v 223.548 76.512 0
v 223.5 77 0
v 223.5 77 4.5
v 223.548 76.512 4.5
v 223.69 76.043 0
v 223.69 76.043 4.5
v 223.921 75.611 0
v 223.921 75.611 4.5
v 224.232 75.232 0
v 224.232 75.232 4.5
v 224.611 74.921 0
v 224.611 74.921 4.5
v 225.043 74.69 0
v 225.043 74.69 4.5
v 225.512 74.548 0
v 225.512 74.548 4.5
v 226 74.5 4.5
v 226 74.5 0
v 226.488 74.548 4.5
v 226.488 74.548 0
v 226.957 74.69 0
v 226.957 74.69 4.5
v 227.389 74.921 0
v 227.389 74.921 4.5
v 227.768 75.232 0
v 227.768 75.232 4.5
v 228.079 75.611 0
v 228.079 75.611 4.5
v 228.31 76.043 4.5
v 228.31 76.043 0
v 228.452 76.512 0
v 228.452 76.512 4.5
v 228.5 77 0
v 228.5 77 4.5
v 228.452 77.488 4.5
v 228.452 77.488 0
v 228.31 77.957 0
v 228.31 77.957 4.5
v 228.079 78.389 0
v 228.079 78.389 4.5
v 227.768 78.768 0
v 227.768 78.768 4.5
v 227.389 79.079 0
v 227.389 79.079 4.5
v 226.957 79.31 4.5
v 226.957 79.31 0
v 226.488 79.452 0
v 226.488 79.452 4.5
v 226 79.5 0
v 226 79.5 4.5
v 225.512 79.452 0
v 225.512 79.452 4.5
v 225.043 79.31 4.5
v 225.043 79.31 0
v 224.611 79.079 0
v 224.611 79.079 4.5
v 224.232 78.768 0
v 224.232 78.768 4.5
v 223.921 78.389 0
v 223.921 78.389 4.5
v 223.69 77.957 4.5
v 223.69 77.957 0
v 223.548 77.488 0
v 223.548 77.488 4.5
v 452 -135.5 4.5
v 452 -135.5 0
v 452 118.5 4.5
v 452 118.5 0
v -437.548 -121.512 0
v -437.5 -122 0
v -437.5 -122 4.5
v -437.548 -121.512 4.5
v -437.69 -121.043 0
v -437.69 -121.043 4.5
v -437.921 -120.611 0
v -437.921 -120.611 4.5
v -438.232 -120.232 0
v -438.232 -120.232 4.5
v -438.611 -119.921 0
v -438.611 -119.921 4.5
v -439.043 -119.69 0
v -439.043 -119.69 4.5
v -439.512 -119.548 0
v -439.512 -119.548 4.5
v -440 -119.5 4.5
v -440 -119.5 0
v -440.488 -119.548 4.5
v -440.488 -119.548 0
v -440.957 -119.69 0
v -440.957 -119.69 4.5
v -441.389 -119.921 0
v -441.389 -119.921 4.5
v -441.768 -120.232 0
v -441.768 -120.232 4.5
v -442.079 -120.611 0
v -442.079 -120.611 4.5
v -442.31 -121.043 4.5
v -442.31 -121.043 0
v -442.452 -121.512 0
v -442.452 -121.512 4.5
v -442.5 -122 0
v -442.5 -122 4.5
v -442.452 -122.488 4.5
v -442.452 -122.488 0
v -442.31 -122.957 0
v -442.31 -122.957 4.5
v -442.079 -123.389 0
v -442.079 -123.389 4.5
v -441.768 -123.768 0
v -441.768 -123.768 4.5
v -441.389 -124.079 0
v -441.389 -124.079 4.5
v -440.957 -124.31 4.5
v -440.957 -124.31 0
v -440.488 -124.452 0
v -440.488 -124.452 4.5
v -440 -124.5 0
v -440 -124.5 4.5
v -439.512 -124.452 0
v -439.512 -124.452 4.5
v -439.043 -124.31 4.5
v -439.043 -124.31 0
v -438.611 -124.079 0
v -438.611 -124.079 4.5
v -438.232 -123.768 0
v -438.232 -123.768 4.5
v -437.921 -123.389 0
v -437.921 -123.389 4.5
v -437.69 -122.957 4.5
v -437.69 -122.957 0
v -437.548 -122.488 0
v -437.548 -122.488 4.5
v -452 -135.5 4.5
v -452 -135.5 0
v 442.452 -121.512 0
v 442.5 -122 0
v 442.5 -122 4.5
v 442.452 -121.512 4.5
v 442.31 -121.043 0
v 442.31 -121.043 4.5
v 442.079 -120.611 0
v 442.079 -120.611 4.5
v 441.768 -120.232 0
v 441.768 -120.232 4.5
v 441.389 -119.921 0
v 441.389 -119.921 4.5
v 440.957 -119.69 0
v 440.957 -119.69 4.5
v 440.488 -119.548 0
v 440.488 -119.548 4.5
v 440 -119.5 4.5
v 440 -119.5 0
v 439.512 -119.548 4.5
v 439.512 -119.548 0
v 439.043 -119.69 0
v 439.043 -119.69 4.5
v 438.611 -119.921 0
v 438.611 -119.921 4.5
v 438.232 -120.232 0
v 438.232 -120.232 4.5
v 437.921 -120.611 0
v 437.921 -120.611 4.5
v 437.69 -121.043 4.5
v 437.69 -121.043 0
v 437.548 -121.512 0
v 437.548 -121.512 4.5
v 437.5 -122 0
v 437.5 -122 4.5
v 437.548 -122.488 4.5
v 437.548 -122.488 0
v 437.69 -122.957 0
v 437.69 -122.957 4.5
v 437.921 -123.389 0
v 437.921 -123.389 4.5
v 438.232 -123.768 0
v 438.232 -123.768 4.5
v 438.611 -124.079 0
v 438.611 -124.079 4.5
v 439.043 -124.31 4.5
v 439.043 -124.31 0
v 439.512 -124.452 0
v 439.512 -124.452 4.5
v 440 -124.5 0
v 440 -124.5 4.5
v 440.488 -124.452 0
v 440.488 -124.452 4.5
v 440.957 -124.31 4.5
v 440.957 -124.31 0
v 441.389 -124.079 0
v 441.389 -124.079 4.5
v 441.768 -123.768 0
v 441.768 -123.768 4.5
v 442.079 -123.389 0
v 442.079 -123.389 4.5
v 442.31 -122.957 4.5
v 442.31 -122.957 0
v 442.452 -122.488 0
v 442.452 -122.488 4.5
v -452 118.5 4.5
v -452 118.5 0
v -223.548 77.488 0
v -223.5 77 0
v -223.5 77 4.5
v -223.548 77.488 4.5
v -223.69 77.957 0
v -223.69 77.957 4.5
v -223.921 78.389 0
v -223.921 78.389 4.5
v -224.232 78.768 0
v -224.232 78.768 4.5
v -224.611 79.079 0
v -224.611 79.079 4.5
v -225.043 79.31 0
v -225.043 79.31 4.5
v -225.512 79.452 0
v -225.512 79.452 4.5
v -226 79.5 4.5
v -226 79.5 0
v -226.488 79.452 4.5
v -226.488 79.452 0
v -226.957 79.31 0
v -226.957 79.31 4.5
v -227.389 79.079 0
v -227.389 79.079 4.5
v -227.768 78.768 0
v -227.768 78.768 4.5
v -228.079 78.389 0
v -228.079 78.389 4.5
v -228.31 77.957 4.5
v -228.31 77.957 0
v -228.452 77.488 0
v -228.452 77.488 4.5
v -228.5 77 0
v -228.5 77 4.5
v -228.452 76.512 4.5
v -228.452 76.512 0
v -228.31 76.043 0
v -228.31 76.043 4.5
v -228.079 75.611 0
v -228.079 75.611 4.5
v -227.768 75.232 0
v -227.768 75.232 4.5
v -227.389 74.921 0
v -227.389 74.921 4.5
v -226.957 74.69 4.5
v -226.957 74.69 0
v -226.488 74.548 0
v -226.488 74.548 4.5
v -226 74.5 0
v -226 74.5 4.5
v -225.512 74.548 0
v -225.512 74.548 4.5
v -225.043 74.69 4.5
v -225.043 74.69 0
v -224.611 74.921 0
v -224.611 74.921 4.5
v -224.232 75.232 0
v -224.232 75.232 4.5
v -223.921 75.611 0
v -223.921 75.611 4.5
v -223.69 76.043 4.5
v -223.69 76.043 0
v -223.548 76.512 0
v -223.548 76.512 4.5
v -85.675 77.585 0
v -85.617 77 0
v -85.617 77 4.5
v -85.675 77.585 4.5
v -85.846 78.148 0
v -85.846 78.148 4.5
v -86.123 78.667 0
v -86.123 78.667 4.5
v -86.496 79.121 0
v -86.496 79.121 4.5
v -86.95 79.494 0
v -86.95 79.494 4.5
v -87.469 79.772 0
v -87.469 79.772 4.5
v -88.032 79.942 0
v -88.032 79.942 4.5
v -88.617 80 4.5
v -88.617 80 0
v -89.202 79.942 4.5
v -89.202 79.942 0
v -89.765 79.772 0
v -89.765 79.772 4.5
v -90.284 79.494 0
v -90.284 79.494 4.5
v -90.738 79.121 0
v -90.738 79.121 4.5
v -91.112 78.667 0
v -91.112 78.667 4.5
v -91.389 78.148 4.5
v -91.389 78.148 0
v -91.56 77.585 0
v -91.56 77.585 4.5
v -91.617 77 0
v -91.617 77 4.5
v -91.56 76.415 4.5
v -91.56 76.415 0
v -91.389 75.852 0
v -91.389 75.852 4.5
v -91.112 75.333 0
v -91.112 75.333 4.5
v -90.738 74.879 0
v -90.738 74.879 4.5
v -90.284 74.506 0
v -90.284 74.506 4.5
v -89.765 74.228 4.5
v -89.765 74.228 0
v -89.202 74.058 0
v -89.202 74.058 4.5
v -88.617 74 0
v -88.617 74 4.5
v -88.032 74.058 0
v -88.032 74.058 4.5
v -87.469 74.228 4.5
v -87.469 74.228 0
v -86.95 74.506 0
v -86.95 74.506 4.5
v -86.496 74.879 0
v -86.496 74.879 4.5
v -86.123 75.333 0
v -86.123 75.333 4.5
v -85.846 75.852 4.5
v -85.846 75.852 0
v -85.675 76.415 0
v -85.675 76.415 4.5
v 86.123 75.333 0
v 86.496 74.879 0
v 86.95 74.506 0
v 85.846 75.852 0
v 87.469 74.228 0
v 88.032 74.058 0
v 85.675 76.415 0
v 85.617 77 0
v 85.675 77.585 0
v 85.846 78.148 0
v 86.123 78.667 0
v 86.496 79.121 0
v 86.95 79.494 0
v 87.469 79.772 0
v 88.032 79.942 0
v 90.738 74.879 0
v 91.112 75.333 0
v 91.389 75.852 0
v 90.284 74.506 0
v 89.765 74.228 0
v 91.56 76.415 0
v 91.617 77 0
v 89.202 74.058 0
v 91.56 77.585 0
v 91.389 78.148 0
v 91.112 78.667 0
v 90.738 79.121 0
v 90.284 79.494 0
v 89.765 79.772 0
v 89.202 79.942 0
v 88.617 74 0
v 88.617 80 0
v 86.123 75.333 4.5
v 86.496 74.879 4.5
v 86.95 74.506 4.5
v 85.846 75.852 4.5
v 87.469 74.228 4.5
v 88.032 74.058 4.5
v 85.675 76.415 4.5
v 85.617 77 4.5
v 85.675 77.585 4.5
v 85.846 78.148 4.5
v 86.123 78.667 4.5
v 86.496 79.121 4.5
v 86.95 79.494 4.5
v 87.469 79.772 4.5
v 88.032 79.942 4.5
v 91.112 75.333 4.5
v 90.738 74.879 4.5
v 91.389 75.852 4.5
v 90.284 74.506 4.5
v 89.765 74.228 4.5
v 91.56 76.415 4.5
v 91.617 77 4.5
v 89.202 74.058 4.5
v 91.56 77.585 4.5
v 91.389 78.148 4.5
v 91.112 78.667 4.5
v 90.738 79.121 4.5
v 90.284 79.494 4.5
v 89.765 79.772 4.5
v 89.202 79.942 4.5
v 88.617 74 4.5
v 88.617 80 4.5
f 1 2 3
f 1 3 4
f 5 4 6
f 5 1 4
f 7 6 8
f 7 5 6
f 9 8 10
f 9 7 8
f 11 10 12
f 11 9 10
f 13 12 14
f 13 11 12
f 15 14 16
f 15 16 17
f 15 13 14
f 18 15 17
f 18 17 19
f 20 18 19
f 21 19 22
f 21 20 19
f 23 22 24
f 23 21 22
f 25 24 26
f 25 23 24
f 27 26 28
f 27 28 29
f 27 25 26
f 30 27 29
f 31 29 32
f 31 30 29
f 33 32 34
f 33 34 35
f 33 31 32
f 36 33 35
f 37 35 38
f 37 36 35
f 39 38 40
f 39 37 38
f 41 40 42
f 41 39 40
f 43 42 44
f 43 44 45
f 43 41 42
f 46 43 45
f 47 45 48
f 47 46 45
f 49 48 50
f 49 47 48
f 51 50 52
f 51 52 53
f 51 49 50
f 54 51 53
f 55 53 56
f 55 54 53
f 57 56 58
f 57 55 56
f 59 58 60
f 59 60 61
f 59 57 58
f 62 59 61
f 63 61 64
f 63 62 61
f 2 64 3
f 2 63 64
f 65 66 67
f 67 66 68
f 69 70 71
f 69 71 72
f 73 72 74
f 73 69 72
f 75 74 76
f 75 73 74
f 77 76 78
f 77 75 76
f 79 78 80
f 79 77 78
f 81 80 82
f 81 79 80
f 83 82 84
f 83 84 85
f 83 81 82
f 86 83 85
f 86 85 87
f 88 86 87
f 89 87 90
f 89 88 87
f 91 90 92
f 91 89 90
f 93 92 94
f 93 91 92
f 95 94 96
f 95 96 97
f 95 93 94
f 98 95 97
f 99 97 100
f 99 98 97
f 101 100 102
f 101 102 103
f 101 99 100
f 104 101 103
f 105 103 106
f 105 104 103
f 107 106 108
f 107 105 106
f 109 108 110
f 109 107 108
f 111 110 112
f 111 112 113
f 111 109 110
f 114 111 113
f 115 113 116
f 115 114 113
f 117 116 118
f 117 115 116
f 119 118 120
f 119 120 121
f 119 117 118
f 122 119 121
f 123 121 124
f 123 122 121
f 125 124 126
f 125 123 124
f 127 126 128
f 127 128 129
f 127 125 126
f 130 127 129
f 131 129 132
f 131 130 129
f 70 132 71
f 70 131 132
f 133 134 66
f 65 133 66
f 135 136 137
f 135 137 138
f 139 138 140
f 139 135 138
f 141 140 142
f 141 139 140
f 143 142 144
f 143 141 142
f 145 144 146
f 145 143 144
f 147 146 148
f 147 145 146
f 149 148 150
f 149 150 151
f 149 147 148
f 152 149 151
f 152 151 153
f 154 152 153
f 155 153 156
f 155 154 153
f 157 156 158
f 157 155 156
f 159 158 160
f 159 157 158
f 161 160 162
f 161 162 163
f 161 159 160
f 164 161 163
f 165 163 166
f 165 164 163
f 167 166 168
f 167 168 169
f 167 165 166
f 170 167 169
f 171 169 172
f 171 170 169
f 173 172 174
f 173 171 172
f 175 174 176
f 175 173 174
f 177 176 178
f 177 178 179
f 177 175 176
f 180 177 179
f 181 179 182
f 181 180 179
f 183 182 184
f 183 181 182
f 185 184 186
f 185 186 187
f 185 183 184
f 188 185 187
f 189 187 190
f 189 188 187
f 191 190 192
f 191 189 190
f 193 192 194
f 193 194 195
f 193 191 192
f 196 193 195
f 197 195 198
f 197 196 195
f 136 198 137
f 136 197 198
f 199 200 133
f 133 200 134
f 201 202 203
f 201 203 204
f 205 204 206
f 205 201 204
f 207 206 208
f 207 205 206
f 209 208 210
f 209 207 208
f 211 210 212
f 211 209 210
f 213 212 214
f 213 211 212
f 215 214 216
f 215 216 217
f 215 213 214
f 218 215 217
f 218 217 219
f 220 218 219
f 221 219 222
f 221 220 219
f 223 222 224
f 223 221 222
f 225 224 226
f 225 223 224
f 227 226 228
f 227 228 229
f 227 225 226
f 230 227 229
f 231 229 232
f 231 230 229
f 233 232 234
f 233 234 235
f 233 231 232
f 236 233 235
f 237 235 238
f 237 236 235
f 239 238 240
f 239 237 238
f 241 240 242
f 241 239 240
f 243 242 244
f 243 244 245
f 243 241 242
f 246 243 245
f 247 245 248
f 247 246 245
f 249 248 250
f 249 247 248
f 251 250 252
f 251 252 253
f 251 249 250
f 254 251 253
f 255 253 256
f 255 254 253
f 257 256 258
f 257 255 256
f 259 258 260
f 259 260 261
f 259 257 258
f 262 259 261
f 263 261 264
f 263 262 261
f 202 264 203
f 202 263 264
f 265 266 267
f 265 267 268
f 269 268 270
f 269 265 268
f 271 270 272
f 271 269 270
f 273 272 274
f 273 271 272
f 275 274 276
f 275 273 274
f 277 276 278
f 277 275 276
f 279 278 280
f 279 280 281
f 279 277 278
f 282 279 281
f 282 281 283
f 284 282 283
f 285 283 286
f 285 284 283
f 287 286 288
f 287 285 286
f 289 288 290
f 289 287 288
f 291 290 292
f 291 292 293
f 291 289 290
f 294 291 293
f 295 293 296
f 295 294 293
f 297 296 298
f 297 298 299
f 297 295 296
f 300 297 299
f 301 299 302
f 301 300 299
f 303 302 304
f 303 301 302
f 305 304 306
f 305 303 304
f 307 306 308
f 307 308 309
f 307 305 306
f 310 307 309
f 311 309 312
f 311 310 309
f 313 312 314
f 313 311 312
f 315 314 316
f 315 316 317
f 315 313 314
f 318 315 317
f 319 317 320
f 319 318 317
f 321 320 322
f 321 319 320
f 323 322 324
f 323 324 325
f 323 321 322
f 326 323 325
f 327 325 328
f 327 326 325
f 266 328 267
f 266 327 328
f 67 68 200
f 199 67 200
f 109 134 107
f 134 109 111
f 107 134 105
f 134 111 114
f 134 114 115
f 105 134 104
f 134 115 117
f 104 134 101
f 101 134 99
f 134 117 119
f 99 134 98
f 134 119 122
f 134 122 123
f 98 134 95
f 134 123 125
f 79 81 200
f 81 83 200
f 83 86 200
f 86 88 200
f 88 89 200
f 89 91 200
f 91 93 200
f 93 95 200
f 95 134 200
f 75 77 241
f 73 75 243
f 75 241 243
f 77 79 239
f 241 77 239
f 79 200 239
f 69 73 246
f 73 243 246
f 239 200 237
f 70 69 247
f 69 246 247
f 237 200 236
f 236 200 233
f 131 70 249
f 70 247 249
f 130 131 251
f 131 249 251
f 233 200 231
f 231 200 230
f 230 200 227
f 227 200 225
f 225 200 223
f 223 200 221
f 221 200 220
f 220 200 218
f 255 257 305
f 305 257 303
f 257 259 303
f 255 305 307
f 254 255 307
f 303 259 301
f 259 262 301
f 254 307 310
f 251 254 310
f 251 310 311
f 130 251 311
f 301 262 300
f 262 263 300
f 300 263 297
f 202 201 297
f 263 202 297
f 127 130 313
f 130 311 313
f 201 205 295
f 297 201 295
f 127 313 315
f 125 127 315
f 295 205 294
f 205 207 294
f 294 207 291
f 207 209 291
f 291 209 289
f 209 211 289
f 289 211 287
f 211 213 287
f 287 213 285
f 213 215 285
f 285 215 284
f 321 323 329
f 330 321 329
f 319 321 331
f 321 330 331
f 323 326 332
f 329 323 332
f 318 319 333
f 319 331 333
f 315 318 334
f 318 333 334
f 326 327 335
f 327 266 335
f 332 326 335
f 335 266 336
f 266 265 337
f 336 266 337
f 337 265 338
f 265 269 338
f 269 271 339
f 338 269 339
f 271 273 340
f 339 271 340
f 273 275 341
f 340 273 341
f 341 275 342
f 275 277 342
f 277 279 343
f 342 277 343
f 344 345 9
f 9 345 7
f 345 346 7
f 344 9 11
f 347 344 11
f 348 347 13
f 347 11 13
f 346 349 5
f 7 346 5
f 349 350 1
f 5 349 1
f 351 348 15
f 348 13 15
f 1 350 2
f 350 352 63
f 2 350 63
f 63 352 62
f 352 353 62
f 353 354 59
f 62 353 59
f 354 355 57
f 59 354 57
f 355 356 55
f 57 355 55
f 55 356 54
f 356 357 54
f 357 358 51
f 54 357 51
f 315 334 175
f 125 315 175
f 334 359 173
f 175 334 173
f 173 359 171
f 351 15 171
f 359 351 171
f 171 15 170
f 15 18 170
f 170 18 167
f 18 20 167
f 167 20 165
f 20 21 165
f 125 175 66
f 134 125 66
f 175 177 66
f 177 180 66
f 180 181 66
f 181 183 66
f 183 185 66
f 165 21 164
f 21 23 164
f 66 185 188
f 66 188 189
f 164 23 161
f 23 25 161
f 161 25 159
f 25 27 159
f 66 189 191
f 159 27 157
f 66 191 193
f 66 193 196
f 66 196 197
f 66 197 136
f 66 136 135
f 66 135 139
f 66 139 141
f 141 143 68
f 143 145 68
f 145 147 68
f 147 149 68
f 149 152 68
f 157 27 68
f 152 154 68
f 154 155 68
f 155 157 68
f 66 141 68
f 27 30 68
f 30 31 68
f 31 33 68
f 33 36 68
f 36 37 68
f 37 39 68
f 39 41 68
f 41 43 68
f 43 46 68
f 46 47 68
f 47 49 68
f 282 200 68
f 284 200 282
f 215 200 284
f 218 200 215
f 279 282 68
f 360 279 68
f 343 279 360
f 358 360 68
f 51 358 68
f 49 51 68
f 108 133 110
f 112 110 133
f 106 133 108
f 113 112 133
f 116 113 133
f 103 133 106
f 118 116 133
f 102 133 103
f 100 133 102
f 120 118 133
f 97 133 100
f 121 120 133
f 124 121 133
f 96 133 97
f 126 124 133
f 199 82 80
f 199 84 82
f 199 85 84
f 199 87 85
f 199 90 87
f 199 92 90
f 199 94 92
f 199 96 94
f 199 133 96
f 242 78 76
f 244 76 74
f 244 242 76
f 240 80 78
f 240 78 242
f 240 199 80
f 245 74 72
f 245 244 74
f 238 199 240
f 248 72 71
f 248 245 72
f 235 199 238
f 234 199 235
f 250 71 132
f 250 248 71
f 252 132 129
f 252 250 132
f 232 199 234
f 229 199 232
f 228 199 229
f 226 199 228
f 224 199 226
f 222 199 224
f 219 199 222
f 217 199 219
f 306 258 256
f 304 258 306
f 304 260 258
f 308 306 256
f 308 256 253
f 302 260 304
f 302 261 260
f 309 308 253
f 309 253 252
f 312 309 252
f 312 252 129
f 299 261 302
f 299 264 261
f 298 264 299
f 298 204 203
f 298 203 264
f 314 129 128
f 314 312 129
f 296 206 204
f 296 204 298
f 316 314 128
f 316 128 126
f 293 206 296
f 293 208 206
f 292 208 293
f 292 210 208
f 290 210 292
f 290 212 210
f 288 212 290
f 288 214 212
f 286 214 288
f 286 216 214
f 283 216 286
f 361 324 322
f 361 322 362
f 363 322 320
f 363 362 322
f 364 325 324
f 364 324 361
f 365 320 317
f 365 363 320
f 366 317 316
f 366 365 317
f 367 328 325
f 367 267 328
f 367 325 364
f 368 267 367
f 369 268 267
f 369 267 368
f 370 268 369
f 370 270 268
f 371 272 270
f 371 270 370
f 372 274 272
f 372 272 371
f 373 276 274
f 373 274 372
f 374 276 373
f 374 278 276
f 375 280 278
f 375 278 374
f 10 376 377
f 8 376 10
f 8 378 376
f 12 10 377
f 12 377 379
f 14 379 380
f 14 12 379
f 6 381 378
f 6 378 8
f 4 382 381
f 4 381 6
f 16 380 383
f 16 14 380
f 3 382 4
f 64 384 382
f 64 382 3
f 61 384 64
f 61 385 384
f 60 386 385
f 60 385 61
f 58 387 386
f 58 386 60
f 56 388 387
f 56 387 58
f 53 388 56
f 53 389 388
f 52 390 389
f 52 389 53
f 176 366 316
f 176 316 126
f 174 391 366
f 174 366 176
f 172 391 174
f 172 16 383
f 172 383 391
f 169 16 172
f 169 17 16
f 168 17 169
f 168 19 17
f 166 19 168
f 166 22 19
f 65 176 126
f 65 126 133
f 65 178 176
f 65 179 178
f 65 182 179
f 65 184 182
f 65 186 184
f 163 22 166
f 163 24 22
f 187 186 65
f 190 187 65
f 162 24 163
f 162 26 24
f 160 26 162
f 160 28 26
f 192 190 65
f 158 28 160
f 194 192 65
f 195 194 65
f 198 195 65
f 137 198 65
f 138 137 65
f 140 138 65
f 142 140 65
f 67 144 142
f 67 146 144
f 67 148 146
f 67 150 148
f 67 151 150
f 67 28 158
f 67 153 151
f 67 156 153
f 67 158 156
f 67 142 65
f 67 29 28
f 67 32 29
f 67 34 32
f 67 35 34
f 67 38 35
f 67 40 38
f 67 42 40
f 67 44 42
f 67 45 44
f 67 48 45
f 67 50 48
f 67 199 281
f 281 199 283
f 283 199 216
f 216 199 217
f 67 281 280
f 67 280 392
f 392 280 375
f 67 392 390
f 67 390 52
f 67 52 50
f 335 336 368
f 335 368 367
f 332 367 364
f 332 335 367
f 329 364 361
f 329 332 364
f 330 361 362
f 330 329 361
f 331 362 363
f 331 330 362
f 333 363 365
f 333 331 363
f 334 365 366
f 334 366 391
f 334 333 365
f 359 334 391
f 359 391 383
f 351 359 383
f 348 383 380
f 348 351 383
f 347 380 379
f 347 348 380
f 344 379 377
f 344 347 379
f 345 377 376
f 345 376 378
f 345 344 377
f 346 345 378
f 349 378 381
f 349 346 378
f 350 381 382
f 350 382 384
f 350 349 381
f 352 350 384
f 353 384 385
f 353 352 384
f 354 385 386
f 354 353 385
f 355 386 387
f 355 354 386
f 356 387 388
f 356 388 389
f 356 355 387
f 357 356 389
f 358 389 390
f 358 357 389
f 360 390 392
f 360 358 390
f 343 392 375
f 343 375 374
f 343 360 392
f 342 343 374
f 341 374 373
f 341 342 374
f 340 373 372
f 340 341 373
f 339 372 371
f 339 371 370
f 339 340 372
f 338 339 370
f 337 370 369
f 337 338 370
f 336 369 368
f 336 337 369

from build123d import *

# Parameters (mm, degrees)
SKETCH1_R           = 2.5
SKETCH1_R_2         = 3
BOSS_EXTRUDE1_DEPTH = 4.5


with BuildPart() as part:
    # Sketch1 → Boss-Extrude1 (new body)
    with BuildSketch(Plane.XY):
        Polygon((-452, 118.5), (-452, -135.5), (452, -135.5), (452, 118.5), (228.5, 118.5), (223.5, 118.5), (2.5, 118.5), (-2.5, 118.5), (-223.5, 118.5), (-228.5, 118.5), align=None)
        with Locations((440, -122)):
            Circle(SKETCH1_R, mode=Mode.SUBTRACT)
        with Locations((-440, -122)):
            Circle(SKETCH1_R, mode=Mode.SUBTRACT)
        with Locations((-226, 77)):
            Circle(SKETCH1_R, mode=Mode.SUBTRACT)
        with Locations(Location((226, 77, 0), (0, 0, 180))):
            Circle(SKETCH1_R, mode=Mode.SUBTRACT)
        with Locations((-88.617163414, 77)):
            Circle(SKETCH1_R_2, mode=Mode.SUBTRACT)
        with Locations(Location((88.617163414, 77, 0), (0, 0, 180))):
            Circle(SKETCH1_R_2, mode=Mode.SUBTRACT)
    extrude(amount=BOSS_EXTRUDE1_DEPTH)


solid = part.part
